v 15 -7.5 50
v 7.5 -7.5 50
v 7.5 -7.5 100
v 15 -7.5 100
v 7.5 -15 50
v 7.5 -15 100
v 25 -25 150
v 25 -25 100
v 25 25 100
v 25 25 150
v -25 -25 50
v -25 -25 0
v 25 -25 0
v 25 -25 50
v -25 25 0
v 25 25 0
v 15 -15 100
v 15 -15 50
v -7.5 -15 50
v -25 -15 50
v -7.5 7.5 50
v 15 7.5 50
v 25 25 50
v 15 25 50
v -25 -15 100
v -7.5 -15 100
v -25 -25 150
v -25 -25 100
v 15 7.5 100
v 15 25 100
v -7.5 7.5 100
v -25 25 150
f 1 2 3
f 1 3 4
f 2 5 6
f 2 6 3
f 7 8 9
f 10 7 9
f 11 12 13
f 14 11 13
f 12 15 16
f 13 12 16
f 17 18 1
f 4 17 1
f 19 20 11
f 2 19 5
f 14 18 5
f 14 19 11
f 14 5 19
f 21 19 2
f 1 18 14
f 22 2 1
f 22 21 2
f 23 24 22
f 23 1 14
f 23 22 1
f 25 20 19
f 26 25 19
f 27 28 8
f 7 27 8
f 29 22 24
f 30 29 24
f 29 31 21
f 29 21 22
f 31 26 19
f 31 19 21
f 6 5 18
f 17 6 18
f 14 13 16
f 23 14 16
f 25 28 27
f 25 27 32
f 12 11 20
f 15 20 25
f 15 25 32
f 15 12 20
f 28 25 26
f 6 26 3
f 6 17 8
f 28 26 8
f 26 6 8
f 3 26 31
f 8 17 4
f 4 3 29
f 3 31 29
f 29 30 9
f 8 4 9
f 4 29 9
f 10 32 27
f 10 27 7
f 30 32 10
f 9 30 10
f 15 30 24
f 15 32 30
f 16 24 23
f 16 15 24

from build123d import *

# Parameters (mm, degrees)
F0_W     = 50
F0_H     = 50
F1_DEPTH = 50
F2_W     = 7.5
F2_H     = 7.5
F3_DEPTH = 50
F4_W     = 50
F4_H     = 50
F5_DEPTH = 50


with BuildPart() as f1:
    # F0 (on Top) → F1 (new body)
    with BuildSketch(Plane.XY):
        Rectangle(F0_W, F0_H)
    extrude(amount=F1_DEPTH)

    # F2 (on face) → F3 (join)
    with BuildSketch(Plane.XY.offset(50)):
        Polygon((15, 25), (-25, 25), (-25, -15), (-7.5, -15), (-7.5, 7.5), (15, 7.5), align=None)
        with Locations((11.25, -11.25)):
            Rectangle(F2_W, F2_H)
    extrude(amount=F3_DEPTH)

    # F4 (on face) → F5 (join)
    with BuildSketch(Plane.XY.offset(100)):
        Rectangle(F4_W, F4_H)
    extrude(amount=F5_DEPTH)


solid = f1.part
